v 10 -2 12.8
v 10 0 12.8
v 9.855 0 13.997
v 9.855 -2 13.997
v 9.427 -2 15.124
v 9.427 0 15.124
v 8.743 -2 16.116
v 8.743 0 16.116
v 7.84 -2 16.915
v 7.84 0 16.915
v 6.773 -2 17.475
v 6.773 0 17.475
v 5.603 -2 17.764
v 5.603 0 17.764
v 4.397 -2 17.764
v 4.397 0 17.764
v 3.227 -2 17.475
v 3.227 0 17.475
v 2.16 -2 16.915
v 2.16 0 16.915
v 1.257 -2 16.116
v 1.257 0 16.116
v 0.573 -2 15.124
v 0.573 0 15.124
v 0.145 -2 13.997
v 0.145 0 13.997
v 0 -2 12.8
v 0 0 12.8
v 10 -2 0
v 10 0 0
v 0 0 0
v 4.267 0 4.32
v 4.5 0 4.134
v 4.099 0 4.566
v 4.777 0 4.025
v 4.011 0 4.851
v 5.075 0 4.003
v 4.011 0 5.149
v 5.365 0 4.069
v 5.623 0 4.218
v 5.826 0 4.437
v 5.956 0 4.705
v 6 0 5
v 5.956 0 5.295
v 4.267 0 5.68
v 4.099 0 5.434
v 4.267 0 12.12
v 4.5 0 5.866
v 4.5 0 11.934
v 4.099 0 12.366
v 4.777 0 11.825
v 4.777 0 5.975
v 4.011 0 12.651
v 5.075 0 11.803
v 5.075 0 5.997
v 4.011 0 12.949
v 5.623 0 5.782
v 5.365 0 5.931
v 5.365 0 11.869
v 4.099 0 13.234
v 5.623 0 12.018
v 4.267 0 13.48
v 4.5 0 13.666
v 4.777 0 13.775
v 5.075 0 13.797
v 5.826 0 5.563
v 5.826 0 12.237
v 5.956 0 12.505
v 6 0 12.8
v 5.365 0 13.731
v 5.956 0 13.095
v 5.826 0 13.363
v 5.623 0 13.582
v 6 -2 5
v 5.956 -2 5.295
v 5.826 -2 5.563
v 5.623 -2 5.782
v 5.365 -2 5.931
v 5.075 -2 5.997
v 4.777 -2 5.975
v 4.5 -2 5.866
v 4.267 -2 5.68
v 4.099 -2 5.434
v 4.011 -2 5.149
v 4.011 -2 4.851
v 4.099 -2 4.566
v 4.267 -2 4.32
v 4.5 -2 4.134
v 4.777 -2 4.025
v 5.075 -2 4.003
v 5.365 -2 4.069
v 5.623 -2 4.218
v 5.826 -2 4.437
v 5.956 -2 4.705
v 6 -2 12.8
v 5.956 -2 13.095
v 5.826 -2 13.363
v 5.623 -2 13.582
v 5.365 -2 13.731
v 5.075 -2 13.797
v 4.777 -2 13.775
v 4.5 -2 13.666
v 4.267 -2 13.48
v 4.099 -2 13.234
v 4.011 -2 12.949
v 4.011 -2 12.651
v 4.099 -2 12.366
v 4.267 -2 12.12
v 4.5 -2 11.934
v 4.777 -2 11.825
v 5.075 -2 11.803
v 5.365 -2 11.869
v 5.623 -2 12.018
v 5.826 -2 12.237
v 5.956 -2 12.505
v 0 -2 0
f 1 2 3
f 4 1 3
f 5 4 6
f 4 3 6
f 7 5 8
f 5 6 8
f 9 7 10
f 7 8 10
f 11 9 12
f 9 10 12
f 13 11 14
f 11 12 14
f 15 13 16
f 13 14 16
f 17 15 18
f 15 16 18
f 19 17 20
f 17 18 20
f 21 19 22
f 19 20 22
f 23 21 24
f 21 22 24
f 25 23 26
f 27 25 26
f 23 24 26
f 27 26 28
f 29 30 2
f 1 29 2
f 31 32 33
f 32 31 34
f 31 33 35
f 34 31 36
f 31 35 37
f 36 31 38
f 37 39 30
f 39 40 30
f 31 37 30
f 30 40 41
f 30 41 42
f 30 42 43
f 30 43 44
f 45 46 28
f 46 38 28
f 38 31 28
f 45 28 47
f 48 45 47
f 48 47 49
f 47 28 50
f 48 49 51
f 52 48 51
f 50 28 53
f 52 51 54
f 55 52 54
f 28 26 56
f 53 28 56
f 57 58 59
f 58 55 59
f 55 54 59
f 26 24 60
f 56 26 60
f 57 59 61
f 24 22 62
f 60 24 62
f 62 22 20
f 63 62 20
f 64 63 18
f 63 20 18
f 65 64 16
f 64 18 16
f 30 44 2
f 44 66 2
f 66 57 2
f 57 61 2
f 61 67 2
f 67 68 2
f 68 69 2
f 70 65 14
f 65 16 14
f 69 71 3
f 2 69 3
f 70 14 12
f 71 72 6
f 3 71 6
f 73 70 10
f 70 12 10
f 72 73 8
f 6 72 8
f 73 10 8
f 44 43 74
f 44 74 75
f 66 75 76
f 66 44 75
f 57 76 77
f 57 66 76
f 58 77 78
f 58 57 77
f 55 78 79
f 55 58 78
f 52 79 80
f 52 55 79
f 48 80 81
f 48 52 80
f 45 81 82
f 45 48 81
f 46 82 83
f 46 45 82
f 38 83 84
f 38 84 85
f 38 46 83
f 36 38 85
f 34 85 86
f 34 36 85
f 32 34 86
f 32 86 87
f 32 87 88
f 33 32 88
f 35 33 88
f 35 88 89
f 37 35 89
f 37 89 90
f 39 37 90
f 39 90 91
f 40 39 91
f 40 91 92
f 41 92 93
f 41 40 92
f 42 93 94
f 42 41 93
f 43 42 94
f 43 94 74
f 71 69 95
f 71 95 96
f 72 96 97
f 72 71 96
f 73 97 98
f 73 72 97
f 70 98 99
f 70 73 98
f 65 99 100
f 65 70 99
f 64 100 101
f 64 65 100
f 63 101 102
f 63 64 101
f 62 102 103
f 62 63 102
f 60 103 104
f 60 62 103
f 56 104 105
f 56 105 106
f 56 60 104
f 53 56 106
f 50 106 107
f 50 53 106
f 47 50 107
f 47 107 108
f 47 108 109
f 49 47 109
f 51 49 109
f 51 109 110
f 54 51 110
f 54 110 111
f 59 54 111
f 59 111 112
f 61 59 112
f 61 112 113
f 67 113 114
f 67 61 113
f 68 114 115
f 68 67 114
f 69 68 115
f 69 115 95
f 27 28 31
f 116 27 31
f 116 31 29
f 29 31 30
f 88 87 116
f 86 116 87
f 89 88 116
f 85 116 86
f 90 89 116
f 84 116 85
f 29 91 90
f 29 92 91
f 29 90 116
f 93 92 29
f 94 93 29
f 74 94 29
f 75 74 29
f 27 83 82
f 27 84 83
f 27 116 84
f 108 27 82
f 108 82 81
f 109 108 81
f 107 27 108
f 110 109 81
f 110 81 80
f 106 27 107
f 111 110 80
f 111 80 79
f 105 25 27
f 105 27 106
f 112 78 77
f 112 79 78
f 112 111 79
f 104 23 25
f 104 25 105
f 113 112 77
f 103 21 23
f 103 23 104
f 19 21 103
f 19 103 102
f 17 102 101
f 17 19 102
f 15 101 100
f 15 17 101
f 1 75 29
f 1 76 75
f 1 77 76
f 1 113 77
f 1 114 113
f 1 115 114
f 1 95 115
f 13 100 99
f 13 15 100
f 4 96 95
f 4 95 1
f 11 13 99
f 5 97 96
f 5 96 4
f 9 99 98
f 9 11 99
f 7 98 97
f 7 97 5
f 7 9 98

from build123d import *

# Parameters (mm, degrees)
F0_R     = 1
F1_DEPTH = 2


with BuildPart() as f1:
    # F0 (on Front) → F1 (new body)
    with BuildSketch(Plane.XZ):
        with BuildLine():
            Line((0, 12.8), (0, 0))
            Line((0, 0), (10, 0))
            Line((10, 0), (10, 12.8))
            ThreePointArc((10, 12.8), (5, 17.8), (0, 12.8))
        make_face()
        with Locations((5, 5)):
            Circle(F0_R, mode=Mode.SUBTRACT)
        with Locations((5, 12.8)):
            Circle(F0_R, mode=Mode.SUBTRACT)
    extrude(amount=F1_DEPTH)


solid = f1.part
